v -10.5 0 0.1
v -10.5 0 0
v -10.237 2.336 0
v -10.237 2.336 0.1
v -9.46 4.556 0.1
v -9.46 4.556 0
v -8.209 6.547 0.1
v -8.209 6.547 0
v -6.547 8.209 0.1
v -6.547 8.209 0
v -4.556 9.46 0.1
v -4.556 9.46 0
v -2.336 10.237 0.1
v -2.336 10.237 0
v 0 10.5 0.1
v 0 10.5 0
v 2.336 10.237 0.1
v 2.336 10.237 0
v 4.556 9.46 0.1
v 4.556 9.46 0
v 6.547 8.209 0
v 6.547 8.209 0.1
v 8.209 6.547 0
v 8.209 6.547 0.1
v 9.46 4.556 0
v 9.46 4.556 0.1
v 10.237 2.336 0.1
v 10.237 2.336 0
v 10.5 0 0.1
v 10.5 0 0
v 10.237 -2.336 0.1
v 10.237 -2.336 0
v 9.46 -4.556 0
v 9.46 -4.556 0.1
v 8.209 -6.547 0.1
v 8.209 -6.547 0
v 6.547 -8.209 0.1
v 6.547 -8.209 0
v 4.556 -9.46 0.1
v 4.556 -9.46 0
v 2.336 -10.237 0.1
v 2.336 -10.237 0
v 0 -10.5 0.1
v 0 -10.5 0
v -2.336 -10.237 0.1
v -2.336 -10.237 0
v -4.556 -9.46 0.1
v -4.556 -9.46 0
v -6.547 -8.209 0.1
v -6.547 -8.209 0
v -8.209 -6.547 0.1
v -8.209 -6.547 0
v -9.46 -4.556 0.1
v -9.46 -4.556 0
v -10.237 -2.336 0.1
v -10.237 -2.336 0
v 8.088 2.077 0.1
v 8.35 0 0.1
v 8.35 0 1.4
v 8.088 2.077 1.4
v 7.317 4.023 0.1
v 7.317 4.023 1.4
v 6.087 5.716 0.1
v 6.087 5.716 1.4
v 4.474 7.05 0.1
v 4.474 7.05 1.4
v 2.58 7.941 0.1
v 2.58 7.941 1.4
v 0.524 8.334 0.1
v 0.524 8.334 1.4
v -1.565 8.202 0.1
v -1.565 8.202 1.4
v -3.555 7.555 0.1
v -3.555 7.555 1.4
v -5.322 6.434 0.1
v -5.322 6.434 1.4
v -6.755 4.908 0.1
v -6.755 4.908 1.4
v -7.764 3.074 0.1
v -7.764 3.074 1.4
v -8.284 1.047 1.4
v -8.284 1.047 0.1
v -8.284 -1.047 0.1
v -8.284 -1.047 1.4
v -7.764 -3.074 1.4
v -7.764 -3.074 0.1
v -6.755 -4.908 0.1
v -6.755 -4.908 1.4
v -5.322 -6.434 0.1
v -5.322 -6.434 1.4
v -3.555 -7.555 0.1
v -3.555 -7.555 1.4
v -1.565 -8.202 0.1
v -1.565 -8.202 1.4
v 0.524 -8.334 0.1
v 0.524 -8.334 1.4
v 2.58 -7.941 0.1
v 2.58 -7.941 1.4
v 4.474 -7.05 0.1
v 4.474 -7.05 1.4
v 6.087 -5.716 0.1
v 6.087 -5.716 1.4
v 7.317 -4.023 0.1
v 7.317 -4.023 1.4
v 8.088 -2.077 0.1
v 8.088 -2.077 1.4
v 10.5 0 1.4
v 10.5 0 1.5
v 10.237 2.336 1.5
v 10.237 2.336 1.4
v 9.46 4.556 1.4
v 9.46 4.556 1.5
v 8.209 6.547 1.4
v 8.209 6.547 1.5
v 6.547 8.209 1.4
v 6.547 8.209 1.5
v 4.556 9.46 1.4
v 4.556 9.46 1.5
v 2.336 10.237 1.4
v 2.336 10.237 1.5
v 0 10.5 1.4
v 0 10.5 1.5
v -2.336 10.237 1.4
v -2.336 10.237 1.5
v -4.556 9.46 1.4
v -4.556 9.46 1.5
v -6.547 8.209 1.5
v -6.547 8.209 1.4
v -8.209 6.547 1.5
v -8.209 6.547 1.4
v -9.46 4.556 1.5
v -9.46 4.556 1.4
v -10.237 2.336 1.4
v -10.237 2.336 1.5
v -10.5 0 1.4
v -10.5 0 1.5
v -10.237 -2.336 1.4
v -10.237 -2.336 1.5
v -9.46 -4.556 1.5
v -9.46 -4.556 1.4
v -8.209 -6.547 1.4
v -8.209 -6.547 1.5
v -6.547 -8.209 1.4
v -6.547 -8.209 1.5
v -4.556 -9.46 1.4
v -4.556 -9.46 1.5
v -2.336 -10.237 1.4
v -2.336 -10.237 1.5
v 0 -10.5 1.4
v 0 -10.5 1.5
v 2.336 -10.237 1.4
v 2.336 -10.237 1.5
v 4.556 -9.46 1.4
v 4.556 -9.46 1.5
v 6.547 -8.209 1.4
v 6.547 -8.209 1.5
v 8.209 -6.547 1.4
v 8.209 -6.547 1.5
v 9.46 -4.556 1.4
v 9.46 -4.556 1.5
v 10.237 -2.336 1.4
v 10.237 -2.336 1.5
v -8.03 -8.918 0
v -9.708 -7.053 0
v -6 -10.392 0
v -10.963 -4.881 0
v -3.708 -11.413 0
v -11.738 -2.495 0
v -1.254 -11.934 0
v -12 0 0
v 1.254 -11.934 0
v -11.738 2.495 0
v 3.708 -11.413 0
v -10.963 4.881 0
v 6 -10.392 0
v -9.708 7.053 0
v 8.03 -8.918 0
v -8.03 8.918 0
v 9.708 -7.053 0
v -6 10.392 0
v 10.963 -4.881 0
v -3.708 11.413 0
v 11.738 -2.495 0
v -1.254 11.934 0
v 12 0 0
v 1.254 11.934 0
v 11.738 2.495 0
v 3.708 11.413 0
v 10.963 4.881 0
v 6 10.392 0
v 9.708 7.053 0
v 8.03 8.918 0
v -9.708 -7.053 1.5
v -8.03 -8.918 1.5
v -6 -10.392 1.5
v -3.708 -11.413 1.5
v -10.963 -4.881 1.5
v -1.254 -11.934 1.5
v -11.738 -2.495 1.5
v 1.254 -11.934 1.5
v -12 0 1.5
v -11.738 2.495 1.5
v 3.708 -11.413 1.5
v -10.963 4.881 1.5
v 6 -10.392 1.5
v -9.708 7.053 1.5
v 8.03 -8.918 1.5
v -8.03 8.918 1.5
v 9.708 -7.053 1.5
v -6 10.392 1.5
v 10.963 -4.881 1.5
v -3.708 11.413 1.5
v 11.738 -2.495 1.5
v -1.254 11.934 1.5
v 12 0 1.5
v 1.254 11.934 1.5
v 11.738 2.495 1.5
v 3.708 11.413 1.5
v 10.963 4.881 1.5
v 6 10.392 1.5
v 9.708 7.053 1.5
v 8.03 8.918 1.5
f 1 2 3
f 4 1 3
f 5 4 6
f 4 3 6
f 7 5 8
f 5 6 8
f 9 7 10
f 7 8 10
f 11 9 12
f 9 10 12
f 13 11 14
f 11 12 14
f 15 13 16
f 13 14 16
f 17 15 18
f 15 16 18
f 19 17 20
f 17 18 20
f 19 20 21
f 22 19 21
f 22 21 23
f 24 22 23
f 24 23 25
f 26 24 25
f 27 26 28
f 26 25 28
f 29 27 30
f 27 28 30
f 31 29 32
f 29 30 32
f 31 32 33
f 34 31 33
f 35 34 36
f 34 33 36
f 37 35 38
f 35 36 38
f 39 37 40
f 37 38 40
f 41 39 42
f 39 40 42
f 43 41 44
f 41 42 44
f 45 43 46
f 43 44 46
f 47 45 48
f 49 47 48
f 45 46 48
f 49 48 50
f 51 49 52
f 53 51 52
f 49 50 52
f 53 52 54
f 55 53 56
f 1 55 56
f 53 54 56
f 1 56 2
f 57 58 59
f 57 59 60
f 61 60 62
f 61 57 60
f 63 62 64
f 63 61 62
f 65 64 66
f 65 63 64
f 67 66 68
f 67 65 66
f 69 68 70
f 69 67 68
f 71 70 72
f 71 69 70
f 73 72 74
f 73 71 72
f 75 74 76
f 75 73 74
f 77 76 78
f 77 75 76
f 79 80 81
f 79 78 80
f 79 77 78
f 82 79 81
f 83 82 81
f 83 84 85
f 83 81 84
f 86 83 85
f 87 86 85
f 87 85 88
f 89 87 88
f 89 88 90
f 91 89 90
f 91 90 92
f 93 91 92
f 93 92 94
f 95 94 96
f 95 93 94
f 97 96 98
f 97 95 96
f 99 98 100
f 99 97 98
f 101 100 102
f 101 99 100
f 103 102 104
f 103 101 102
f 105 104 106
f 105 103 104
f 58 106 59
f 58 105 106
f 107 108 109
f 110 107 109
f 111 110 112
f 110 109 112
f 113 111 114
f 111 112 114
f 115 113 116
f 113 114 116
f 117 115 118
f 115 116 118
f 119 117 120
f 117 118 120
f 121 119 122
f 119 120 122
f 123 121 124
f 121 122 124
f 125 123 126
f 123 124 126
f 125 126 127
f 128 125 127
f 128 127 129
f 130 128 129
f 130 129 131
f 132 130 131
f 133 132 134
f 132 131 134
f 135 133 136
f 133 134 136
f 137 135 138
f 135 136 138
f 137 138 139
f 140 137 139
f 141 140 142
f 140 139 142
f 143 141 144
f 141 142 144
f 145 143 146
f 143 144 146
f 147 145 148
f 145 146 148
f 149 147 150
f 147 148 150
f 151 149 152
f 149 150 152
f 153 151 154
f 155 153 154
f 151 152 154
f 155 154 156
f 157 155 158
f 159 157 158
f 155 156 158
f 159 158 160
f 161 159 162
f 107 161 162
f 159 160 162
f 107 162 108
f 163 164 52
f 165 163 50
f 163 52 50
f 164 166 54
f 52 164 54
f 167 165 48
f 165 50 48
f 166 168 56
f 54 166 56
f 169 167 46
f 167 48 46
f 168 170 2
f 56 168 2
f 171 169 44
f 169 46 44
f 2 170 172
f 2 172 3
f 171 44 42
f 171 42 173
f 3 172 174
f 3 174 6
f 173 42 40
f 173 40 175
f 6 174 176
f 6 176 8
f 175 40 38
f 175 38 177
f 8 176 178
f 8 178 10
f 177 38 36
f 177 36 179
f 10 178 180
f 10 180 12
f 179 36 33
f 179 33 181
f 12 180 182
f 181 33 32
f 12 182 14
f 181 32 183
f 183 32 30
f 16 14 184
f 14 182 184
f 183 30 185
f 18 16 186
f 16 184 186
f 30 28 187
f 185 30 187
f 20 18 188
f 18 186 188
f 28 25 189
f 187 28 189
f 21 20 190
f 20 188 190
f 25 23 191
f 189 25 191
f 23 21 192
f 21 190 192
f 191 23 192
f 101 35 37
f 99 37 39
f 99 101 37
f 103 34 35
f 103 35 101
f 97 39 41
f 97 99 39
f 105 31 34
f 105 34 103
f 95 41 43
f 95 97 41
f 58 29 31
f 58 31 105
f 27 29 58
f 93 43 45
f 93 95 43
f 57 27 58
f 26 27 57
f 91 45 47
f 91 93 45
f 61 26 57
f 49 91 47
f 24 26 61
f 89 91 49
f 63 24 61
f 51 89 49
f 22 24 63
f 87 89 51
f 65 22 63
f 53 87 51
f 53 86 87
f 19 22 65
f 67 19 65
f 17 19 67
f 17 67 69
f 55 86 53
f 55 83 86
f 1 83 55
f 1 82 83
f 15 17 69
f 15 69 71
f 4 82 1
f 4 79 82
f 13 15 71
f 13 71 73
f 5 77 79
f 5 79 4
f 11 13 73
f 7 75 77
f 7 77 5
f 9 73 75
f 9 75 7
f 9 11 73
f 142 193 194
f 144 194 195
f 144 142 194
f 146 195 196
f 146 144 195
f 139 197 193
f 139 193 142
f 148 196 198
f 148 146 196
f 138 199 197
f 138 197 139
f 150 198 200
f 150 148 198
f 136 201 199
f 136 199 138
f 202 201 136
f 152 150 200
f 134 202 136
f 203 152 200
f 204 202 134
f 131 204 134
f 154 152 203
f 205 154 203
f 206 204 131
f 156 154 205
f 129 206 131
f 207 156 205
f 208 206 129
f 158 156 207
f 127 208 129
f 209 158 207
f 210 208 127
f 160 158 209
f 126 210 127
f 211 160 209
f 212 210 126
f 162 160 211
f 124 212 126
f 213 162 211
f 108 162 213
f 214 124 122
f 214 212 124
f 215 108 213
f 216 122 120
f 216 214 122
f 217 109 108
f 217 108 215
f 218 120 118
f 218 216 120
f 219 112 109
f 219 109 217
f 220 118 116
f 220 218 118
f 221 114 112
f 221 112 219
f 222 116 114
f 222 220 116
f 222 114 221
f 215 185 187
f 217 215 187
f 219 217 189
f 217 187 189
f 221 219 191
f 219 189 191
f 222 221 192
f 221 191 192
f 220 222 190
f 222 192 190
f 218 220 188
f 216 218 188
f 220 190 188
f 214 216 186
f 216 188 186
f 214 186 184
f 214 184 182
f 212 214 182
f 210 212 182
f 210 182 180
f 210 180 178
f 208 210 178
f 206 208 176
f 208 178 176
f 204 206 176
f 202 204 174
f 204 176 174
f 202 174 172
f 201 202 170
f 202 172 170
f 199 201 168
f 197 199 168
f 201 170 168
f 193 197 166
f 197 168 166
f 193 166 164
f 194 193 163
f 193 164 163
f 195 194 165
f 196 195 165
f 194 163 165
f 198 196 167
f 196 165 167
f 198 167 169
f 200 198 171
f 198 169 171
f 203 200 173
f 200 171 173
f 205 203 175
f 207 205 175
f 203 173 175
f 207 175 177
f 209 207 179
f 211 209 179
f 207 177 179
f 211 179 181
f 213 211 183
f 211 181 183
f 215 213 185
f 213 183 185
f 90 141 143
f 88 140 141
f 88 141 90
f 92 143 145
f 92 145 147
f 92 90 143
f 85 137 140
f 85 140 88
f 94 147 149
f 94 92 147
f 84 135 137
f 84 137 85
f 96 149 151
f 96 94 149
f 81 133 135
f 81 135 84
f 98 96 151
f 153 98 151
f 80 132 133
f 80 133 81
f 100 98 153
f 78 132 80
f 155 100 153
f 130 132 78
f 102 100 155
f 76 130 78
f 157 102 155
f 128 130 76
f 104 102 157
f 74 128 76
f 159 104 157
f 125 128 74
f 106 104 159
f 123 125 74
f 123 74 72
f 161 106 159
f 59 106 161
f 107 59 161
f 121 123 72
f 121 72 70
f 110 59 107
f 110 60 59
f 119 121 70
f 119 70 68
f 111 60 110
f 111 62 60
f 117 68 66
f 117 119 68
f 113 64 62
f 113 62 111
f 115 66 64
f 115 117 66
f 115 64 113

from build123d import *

# Parameters (mm, degrees)
SKETCH1_R           = 12
SKETCH1_R_2         = 8.35
BOSS_EXTRUDE1_DEPTH = 1.5
SKETCH3_R           = 10.5
CUT_EXTRUDE1_DEPTH  = 0.1
CUT_EXTRUDE2_START  = -0.1
SKETCH4_R           = 10.5
CUT_EXTRUDE2_DEPTH  = 0.1


with BuildPart() as part:
    # Sketch1 → Boss-Extrude1 (new body)
    with BuildSketch(Plane.XY):
        Circle(SKETCH1_R)
        Circle(SKETCH1_R_2, mode=Mode.SUBTRACT)
    extrude(amount=BOSS_EXTRUDE1_DEPTH)

    # Sketch3 → Cut-Extrude1 (cut)
    with BuildSketch(Plane.XY.offset(1.5)):
        Circle(SKETCH3_R)
    extrude(amount=-CUT_EXTRUDE1_DEPTH, mode=Mode.SUBTRACT)

    # Sketch4 → Cut-Extrude2 (cut)
    with BuildSketch(Plane(origin=(0, 0, 0), x_dir=(-1, 0, 0), z_dir=(0, 0, -1)).offset(CUT_EXTRUDE2_START)):
        Circle(SKETCH4_R)
    extrude(amount=CUT_EXTRUDE2_DEPTH, mode=Mode.SUBTRACT)


solid = part.part
